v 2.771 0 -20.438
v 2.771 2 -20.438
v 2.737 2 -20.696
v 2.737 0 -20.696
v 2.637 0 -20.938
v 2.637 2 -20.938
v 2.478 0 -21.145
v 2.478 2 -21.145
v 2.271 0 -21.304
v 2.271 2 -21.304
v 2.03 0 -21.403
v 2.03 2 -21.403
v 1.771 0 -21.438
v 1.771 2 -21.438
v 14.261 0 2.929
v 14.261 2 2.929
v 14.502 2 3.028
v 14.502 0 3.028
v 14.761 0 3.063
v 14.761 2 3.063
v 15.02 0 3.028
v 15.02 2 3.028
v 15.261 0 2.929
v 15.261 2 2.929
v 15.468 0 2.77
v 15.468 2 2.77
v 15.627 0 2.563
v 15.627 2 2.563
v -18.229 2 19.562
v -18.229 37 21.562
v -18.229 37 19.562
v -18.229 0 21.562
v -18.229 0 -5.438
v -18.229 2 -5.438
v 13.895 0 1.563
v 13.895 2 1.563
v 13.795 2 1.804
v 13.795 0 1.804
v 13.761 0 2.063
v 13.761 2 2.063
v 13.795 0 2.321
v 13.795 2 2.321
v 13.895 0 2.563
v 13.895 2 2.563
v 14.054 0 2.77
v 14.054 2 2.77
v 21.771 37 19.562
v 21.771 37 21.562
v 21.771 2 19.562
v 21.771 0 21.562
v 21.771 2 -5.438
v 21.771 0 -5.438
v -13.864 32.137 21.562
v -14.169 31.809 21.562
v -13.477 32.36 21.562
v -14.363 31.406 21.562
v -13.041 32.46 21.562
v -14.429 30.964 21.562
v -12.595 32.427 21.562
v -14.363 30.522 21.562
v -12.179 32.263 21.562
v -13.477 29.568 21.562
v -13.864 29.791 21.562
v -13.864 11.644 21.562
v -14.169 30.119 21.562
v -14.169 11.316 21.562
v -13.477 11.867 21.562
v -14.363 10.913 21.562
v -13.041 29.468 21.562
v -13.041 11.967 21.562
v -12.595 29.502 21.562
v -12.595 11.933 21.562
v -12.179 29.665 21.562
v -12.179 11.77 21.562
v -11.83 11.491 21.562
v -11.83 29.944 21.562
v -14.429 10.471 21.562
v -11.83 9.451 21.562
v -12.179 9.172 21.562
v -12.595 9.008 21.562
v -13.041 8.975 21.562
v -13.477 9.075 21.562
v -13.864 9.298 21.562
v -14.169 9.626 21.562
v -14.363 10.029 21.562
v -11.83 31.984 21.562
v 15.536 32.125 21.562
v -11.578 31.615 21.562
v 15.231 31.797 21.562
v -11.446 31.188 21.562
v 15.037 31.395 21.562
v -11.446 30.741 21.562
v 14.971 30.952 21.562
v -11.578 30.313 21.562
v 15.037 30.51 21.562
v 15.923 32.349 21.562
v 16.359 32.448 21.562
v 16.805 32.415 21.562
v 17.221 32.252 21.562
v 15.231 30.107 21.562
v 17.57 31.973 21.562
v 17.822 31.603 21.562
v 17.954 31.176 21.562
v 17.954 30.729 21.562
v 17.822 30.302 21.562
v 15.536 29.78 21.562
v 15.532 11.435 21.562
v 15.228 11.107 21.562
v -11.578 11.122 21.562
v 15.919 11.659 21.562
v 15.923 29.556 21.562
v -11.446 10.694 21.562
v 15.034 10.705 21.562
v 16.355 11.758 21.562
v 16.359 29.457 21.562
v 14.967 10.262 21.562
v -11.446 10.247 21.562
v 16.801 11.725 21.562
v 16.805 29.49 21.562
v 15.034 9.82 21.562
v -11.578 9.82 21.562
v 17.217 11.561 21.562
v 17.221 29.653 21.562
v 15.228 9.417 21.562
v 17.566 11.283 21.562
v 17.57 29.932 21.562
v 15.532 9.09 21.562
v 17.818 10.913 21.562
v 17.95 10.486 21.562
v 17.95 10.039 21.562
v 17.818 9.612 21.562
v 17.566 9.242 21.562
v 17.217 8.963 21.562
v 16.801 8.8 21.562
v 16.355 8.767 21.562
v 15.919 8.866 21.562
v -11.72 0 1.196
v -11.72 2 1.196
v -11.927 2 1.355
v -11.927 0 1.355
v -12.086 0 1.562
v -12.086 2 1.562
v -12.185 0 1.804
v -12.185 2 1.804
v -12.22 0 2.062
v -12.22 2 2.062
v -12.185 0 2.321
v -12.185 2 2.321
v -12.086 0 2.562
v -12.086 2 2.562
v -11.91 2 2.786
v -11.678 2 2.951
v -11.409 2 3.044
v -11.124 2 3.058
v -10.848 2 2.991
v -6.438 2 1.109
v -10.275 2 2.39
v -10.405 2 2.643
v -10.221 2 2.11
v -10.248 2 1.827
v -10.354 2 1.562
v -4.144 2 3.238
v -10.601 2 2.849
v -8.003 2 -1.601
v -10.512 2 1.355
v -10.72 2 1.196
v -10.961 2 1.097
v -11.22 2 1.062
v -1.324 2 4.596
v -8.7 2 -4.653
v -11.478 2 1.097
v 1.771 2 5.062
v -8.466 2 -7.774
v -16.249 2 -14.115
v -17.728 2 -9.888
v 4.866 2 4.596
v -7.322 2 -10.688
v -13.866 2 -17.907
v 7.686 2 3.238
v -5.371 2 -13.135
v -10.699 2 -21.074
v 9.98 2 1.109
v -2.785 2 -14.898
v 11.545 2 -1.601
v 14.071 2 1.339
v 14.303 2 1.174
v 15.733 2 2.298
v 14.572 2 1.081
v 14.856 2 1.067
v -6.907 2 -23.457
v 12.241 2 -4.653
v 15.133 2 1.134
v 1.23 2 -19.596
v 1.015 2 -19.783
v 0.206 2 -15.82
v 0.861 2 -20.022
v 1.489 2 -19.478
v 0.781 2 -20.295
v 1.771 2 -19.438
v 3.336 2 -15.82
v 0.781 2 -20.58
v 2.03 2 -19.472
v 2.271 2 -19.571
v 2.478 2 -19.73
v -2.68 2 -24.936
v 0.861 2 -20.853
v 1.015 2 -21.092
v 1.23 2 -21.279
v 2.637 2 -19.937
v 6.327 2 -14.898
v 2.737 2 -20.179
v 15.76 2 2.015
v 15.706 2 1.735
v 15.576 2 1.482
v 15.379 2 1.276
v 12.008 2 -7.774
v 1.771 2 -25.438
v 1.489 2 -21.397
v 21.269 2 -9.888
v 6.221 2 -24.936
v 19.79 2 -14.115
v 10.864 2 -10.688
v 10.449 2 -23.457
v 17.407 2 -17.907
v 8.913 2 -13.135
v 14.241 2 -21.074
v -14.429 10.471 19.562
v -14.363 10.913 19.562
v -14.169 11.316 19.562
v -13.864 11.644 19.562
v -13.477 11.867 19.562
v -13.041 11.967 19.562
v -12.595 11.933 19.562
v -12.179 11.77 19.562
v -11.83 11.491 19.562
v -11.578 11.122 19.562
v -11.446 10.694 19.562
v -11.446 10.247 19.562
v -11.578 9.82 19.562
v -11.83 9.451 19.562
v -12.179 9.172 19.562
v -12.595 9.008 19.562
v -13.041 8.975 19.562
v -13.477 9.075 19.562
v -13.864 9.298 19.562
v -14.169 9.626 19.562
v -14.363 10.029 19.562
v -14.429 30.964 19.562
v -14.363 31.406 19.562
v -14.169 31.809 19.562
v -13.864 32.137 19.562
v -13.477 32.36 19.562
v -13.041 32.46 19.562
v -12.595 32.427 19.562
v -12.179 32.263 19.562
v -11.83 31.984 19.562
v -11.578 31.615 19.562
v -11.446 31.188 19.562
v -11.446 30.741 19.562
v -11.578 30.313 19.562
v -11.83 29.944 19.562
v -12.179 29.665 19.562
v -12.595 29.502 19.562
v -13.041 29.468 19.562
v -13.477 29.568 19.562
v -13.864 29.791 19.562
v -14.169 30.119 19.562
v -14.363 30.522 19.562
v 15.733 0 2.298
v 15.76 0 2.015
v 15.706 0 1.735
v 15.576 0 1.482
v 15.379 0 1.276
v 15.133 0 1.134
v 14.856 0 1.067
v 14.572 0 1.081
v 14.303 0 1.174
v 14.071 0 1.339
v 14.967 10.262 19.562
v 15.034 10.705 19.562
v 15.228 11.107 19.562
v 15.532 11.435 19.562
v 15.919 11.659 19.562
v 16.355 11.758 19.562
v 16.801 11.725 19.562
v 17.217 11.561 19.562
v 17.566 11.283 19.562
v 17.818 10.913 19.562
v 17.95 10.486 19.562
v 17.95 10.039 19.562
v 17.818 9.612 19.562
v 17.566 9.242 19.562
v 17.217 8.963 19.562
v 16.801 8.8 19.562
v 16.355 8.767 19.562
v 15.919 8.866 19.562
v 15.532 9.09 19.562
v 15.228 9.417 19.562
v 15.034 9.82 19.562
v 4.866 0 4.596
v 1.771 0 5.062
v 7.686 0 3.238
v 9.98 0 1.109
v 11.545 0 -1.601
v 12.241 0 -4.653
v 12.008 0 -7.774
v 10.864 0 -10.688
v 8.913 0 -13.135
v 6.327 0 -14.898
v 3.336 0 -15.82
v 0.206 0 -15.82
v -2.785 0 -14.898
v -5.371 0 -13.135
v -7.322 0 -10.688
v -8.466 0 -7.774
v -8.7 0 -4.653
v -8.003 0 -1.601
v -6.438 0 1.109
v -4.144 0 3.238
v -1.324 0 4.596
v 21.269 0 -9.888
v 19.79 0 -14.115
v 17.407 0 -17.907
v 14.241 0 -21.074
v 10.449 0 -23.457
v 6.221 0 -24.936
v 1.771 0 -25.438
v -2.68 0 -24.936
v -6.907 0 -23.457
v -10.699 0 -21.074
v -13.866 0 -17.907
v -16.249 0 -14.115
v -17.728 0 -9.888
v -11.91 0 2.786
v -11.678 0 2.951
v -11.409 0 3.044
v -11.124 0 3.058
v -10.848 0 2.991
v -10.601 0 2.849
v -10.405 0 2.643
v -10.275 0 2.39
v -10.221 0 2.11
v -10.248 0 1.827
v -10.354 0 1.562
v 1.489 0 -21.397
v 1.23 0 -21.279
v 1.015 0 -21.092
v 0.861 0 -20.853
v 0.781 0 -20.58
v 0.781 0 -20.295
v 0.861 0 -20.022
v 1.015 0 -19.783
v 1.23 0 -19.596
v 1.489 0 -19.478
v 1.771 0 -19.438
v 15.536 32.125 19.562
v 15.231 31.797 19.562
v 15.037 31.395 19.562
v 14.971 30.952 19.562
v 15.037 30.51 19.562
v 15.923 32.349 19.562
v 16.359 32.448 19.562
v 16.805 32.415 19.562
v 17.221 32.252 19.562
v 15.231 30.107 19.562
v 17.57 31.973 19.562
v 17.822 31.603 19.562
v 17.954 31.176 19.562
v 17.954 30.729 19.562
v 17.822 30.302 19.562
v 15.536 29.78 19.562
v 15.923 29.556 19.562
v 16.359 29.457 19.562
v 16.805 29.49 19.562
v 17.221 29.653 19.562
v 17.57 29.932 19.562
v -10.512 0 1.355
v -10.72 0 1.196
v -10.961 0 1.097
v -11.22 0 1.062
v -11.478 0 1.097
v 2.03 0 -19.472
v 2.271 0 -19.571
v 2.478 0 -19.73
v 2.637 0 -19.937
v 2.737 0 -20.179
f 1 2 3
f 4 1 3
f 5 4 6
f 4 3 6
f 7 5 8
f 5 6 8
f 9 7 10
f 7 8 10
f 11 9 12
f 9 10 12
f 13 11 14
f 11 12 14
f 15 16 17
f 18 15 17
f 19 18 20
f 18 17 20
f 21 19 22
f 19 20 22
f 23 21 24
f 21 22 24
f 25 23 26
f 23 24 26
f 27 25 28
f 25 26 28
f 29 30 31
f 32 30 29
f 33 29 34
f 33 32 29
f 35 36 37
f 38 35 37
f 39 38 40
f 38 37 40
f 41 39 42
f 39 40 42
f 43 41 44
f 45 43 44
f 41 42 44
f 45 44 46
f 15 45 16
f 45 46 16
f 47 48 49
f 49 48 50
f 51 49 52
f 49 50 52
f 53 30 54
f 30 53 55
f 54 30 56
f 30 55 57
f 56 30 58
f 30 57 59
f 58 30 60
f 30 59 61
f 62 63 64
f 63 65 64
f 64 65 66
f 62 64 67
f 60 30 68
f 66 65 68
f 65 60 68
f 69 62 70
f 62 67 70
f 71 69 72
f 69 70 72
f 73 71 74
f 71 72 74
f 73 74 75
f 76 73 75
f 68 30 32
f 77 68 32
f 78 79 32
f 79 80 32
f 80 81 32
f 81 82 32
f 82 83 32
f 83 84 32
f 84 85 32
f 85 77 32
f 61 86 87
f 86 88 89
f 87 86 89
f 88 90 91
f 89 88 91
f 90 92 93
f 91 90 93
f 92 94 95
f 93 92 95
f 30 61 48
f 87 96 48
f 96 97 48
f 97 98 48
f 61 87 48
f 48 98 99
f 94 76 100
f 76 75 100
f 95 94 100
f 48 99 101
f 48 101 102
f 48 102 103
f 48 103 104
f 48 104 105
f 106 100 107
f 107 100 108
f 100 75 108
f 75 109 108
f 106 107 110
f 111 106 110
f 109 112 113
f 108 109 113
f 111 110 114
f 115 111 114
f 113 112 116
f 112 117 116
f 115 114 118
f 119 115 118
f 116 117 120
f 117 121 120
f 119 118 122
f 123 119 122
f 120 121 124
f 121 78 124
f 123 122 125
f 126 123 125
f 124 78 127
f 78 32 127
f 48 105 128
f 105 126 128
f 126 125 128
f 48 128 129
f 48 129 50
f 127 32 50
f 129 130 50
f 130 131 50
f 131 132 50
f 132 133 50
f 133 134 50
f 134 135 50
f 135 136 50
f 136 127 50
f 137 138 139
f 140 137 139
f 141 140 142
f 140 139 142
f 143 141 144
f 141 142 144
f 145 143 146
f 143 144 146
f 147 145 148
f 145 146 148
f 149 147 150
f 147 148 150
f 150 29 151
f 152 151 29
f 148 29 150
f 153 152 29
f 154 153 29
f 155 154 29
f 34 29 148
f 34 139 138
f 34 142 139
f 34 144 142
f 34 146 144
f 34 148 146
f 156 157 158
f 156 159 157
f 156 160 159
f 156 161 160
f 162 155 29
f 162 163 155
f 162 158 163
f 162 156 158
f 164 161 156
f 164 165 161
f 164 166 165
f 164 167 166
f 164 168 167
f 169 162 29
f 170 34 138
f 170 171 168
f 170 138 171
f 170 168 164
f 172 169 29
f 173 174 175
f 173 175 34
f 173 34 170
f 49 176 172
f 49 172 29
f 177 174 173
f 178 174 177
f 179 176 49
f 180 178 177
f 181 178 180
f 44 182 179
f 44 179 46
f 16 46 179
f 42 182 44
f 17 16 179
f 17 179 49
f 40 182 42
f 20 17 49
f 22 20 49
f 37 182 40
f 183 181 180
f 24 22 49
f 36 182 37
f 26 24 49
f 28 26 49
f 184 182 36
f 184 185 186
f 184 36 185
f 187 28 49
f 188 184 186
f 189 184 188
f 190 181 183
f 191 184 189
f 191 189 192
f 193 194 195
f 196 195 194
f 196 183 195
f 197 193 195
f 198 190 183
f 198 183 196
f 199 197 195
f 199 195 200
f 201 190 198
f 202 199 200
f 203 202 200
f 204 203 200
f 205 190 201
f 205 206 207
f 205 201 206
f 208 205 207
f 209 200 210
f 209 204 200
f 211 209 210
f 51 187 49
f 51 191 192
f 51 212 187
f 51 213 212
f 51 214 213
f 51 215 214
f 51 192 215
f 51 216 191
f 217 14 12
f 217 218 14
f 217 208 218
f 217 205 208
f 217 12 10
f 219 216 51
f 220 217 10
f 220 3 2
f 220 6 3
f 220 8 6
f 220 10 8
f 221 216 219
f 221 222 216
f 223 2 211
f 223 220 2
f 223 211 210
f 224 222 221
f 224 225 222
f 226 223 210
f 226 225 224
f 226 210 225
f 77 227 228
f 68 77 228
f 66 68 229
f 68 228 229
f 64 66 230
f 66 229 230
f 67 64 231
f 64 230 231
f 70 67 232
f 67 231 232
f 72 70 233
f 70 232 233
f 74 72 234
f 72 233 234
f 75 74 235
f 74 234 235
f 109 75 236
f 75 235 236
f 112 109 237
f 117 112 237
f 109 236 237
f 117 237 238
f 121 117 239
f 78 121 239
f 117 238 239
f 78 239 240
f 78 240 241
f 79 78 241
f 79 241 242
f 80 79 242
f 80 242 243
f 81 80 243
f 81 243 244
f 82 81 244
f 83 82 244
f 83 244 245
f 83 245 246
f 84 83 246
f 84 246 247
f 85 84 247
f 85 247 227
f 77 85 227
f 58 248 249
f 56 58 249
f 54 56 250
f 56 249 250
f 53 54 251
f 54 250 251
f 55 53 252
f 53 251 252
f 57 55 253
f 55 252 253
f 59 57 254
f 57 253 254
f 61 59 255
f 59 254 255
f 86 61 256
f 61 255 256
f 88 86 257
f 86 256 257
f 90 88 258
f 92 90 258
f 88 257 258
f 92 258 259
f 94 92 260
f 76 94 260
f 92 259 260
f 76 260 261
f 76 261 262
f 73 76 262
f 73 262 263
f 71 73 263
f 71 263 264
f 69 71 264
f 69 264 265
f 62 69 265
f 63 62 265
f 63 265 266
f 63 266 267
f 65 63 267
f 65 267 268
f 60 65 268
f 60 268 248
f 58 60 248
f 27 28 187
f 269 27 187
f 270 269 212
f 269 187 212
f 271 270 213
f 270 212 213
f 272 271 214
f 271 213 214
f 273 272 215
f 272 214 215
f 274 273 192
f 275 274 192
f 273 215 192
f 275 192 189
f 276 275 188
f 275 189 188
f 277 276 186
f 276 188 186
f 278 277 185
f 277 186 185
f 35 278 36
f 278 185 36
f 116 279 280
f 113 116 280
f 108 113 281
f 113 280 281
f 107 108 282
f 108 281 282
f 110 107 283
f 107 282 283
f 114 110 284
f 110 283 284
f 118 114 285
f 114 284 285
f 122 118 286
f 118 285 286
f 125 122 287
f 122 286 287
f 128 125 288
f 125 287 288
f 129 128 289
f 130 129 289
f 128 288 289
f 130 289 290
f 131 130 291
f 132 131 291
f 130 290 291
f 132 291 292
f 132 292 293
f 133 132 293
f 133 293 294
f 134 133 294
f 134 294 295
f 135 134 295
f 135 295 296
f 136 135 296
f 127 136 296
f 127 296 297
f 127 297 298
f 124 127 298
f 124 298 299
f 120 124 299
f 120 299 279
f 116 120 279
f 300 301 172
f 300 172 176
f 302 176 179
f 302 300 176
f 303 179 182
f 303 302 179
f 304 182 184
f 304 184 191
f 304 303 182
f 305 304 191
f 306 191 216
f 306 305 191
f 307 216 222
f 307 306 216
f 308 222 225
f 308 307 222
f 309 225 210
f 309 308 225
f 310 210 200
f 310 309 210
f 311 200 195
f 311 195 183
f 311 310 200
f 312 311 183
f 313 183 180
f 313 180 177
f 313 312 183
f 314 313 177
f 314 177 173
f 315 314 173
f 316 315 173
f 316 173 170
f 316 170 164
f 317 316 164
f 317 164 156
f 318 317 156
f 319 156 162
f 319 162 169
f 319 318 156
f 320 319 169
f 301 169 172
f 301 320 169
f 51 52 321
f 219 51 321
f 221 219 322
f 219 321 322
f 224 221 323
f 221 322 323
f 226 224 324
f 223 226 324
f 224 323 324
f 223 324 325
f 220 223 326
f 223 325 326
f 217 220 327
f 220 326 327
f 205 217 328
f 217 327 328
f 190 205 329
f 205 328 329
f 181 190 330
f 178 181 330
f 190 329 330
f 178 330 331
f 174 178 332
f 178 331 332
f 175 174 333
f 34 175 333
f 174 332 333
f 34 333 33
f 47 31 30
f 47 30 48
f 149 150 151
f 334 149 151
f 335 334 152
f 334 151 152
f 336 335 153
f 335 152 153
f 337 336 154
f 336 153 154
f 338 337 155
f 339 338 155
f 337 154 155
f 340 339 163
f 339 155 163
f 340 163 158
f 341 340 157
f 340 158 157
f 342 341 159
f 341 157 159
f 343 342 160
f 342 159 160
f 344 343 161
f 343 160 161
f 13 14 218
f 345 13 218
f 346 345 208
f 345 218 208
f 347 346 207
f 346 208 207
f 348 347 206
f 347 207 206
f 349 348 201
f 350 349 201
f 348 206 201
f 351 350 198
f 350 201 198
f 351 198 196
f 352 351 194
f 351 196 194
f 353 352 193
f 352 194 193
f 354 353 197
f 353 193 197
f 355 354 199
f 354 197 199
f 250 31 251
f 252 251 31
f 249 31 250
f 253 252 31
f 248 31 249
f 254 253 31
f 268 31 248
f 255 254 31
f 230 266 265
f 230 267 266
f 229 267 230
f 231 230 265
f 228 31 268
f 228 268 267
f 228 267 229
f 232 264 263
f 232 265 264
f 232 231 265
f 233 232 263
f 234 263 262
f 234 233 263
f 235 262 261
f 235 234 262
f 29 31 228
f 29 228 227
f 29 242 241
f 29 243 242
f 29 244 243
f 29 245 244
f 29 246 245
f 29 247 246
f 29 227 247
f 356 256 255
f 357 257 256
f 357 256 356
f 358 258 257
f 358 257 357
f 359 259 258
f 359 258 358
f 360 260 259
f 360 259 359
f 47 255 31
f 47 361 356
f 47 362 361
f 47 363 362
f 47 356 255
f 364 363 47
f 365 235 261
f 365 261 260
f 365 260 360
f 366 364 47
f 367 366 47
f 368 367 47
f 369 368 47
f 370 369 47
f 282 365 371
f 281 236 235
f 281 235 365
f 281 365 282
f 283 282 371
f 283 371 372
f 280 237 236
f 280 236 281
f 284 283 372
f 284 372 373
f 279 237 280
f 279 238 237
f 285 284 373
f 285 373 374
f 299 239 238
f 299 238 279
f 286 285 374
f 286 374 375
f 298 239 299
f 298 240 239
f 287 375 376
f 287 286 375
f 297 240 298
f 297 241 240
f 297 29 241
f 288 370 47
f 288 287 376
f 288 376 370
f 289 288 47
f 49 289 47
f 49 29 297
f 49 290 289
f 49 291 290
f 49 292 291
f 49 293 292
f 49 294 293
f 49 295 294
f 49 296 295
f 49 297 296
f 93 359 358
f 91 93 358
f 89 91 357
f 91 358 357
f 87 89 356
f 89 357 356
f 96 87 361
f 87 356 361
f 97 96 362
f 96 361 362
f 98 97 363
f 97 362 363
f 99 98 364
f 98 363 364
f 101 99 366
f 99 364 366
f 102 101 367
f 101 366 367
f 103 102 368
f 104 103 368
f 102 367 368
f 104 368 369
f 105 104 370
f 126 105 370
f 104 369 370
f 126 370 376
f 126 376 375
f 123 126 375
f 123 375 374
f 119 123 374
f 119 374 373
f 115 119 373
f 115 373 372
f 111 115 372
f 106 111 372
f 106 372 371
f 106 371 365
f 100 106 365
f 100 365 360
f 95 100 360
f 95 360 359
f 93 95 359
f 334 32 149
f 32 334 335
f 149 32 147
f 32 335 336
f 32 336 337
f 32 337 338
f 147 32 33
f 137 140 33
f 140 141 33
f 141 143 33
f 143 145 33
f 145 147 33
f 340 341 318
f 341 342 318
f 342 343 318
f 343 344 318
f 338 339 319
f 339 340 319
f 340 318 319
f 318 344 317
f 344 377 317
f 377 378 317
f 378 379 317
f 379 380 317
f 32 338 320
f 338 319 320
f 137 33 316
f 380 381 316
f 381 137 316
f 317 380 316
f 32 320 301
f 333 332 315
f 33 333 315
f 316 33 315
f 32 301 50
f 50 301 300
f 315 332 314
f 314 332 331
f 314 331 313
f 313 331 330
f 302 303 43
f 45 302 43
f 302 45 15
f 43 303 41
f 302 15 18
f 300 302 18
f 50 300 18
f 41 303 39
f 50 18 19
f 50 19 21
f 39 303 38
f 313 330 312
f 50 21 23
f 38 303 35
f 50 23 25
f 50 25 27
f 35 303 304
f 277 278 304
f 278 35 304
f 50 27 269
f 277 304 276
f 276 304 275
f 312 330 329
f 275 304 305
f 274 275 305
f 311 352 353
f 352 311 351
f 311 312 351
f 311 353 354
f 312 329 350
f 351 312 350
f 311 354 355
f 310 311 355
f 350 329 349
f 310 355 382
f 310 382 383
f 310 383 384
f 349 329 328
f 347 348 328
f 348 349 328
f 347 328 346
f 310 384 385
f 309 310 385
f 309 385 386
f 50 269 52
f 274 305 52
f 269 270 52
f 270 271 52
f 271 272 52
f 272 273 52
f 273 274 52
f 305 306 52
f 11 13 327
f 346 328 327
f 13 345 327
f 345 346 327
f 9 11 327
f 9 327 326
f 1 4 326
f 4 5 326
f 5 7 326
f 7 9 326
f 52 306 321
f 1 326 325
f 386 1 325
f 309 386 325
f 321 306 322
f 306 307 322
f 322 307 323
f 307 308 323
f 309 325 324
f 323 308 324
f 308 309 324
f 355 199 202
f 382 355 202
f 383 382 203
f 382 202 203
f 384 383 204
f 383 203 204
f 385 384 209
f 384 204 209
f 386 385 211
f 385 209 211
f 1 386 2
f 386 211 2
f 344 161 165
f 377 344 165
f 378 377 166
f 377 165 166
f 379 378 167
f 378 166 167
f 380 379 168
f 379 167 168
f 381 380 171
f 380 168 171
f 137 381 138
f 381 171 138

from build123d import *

# Parameters (mm, degrees)
SKETCH1_R           = 10.5
BOSS_EXTRUDE2_DEPTH = 2
SKETCH2_W           = 40
SKETCH2_H           = 2
BOSS_EXTRUDE3_DEPTH = 35
CUT_EXTRUDE1_DEPTH  = 35
CIRPATTERN1_COUNT   = 3
SKETCH5_R           = 1.5
CUT_EXTRUDE2_DEPTH  = 35
SKETCH6_R           = 1.5
CUT_EXTRUDE3_DEPTH  = 35


with BuildPart() as part:
    # Sketch1 → Boss-Extrude2 (new body)
    with BuildSketch(Plane(origin=(0, 0, 0), x_dir=(1, 0, 0), z_dir=(0, 1, 0))):
        with BuildLine():
            Line((-18.229166667, 5.4375), (-18.229166667, -21.5625))
            Line((-18.229166667, -21.5625), (21.770833333, -21.5625))
            Line((21.770833333, -21.5625), (21.770833333, 5.4375))
            ThreePointArc((21.770833333, 5.4375), (1.770833333, 25.4375), (-18.229166667, 5.4375))
        make_face()
        with Locations(Location((1.770833333, 5.4375, 0), (0, 0, 270))):
            Circle(SKETCH1_R, mode=Mode.SUBTRACT)
    extrude(amount=BOSS_EXTRUDE2_DEPTH)

    # Sketch2 → Boss-Extrude3 (add)
    with BuildSketch(Plane(origin=(0, 2, 0), x_dir=(1, 0, 0), z_dir=(0, 1, 0))):
        with Locations((1.770833333, -20.5625)):
            Rectangle(SKETCH2_W, SKETCH2_H)
    extrude(amount=BOSS_EXTRUDE3_DEPTH)

    # Sketch4 → Cut-Extrude1 (cut)
    with BuildSketch(Plane(origin=(0, 2, 0), x_dir=(1, 0, 0), z_dir=(0, 1, 0))):
        with BuildLine():
            ThreePointArc((1.770833333, 21.4375), (0.770833333, 20.4375), (1.770833333, 19.4375))
            Line((1.770833333, 19.4375), (1.770833333, 21.4375))
        make_face()
        with BuildLine():
            Line((1.770833333, 21.4375), (1.770833333, 19.4375))
            ThreePointArc((1.770833333, 19.4375), (2.477940115, 19.730393219), (2.770833333, 20.4375))
            ThreePointArc((2.770833333, 20.4375), (2.477940115, 21.144606781), (1.770833333, 21.4375))
        make_face()
    cut_extrude1 = extrude(amount=-CUT_EXTRUDE1_DEPTH, mode=Mode.SUBTRACT)

    # CirPattern1: Cut-Extrude1 ×3 about axis
    cirpattern1_axis = Axis((1.770833333, 0, -5.4375), (0, 1, 0))
    for i in range(1, CIRPATTERN1_COUNT):
        add(cut_extrude1.rotate(cirpattern1_axis, i * 360 / CIRPATTERN1_COUNT), mode=Mode.SUBTRACT)

    # Sketch5 → Cut-Extrude2 (cut)
    with BuildSketch(Plane(origin=(0, 0, 19.5625), x_dir=(-1, 0, 0), z_dir=(0, 0, -1))):
        with Locations((-16.466888349, 10.262371912)):
            Circle(SKETCH5_R)
        with Locations((-16.470833333, 30.952470071)):
            Circle(SKETCH5_R)
    extrude(amount=-CUT_EXTRUDE2_DEPTH, mode=Mode.SUBTRACT)

    # Sketch6 → Cut-Extrude3 (cut)
    with BuildSketch(Plane(origin=(0, 0, 19.5625), x_dir=(-1, 0, 0), z_dir=(0, 0, -1))):
        with Locations((12.929166667, 30.96416702)):
            Circle(SKETCH6_R)
        with Locations((12.929166667, 10.470851603)):
            Circle(SKETCH6_R)
    extrude(amount=-CUT_EXTRUDE3_DEPTH, mode=Mode.SUBTRACT)


solid = part.part
